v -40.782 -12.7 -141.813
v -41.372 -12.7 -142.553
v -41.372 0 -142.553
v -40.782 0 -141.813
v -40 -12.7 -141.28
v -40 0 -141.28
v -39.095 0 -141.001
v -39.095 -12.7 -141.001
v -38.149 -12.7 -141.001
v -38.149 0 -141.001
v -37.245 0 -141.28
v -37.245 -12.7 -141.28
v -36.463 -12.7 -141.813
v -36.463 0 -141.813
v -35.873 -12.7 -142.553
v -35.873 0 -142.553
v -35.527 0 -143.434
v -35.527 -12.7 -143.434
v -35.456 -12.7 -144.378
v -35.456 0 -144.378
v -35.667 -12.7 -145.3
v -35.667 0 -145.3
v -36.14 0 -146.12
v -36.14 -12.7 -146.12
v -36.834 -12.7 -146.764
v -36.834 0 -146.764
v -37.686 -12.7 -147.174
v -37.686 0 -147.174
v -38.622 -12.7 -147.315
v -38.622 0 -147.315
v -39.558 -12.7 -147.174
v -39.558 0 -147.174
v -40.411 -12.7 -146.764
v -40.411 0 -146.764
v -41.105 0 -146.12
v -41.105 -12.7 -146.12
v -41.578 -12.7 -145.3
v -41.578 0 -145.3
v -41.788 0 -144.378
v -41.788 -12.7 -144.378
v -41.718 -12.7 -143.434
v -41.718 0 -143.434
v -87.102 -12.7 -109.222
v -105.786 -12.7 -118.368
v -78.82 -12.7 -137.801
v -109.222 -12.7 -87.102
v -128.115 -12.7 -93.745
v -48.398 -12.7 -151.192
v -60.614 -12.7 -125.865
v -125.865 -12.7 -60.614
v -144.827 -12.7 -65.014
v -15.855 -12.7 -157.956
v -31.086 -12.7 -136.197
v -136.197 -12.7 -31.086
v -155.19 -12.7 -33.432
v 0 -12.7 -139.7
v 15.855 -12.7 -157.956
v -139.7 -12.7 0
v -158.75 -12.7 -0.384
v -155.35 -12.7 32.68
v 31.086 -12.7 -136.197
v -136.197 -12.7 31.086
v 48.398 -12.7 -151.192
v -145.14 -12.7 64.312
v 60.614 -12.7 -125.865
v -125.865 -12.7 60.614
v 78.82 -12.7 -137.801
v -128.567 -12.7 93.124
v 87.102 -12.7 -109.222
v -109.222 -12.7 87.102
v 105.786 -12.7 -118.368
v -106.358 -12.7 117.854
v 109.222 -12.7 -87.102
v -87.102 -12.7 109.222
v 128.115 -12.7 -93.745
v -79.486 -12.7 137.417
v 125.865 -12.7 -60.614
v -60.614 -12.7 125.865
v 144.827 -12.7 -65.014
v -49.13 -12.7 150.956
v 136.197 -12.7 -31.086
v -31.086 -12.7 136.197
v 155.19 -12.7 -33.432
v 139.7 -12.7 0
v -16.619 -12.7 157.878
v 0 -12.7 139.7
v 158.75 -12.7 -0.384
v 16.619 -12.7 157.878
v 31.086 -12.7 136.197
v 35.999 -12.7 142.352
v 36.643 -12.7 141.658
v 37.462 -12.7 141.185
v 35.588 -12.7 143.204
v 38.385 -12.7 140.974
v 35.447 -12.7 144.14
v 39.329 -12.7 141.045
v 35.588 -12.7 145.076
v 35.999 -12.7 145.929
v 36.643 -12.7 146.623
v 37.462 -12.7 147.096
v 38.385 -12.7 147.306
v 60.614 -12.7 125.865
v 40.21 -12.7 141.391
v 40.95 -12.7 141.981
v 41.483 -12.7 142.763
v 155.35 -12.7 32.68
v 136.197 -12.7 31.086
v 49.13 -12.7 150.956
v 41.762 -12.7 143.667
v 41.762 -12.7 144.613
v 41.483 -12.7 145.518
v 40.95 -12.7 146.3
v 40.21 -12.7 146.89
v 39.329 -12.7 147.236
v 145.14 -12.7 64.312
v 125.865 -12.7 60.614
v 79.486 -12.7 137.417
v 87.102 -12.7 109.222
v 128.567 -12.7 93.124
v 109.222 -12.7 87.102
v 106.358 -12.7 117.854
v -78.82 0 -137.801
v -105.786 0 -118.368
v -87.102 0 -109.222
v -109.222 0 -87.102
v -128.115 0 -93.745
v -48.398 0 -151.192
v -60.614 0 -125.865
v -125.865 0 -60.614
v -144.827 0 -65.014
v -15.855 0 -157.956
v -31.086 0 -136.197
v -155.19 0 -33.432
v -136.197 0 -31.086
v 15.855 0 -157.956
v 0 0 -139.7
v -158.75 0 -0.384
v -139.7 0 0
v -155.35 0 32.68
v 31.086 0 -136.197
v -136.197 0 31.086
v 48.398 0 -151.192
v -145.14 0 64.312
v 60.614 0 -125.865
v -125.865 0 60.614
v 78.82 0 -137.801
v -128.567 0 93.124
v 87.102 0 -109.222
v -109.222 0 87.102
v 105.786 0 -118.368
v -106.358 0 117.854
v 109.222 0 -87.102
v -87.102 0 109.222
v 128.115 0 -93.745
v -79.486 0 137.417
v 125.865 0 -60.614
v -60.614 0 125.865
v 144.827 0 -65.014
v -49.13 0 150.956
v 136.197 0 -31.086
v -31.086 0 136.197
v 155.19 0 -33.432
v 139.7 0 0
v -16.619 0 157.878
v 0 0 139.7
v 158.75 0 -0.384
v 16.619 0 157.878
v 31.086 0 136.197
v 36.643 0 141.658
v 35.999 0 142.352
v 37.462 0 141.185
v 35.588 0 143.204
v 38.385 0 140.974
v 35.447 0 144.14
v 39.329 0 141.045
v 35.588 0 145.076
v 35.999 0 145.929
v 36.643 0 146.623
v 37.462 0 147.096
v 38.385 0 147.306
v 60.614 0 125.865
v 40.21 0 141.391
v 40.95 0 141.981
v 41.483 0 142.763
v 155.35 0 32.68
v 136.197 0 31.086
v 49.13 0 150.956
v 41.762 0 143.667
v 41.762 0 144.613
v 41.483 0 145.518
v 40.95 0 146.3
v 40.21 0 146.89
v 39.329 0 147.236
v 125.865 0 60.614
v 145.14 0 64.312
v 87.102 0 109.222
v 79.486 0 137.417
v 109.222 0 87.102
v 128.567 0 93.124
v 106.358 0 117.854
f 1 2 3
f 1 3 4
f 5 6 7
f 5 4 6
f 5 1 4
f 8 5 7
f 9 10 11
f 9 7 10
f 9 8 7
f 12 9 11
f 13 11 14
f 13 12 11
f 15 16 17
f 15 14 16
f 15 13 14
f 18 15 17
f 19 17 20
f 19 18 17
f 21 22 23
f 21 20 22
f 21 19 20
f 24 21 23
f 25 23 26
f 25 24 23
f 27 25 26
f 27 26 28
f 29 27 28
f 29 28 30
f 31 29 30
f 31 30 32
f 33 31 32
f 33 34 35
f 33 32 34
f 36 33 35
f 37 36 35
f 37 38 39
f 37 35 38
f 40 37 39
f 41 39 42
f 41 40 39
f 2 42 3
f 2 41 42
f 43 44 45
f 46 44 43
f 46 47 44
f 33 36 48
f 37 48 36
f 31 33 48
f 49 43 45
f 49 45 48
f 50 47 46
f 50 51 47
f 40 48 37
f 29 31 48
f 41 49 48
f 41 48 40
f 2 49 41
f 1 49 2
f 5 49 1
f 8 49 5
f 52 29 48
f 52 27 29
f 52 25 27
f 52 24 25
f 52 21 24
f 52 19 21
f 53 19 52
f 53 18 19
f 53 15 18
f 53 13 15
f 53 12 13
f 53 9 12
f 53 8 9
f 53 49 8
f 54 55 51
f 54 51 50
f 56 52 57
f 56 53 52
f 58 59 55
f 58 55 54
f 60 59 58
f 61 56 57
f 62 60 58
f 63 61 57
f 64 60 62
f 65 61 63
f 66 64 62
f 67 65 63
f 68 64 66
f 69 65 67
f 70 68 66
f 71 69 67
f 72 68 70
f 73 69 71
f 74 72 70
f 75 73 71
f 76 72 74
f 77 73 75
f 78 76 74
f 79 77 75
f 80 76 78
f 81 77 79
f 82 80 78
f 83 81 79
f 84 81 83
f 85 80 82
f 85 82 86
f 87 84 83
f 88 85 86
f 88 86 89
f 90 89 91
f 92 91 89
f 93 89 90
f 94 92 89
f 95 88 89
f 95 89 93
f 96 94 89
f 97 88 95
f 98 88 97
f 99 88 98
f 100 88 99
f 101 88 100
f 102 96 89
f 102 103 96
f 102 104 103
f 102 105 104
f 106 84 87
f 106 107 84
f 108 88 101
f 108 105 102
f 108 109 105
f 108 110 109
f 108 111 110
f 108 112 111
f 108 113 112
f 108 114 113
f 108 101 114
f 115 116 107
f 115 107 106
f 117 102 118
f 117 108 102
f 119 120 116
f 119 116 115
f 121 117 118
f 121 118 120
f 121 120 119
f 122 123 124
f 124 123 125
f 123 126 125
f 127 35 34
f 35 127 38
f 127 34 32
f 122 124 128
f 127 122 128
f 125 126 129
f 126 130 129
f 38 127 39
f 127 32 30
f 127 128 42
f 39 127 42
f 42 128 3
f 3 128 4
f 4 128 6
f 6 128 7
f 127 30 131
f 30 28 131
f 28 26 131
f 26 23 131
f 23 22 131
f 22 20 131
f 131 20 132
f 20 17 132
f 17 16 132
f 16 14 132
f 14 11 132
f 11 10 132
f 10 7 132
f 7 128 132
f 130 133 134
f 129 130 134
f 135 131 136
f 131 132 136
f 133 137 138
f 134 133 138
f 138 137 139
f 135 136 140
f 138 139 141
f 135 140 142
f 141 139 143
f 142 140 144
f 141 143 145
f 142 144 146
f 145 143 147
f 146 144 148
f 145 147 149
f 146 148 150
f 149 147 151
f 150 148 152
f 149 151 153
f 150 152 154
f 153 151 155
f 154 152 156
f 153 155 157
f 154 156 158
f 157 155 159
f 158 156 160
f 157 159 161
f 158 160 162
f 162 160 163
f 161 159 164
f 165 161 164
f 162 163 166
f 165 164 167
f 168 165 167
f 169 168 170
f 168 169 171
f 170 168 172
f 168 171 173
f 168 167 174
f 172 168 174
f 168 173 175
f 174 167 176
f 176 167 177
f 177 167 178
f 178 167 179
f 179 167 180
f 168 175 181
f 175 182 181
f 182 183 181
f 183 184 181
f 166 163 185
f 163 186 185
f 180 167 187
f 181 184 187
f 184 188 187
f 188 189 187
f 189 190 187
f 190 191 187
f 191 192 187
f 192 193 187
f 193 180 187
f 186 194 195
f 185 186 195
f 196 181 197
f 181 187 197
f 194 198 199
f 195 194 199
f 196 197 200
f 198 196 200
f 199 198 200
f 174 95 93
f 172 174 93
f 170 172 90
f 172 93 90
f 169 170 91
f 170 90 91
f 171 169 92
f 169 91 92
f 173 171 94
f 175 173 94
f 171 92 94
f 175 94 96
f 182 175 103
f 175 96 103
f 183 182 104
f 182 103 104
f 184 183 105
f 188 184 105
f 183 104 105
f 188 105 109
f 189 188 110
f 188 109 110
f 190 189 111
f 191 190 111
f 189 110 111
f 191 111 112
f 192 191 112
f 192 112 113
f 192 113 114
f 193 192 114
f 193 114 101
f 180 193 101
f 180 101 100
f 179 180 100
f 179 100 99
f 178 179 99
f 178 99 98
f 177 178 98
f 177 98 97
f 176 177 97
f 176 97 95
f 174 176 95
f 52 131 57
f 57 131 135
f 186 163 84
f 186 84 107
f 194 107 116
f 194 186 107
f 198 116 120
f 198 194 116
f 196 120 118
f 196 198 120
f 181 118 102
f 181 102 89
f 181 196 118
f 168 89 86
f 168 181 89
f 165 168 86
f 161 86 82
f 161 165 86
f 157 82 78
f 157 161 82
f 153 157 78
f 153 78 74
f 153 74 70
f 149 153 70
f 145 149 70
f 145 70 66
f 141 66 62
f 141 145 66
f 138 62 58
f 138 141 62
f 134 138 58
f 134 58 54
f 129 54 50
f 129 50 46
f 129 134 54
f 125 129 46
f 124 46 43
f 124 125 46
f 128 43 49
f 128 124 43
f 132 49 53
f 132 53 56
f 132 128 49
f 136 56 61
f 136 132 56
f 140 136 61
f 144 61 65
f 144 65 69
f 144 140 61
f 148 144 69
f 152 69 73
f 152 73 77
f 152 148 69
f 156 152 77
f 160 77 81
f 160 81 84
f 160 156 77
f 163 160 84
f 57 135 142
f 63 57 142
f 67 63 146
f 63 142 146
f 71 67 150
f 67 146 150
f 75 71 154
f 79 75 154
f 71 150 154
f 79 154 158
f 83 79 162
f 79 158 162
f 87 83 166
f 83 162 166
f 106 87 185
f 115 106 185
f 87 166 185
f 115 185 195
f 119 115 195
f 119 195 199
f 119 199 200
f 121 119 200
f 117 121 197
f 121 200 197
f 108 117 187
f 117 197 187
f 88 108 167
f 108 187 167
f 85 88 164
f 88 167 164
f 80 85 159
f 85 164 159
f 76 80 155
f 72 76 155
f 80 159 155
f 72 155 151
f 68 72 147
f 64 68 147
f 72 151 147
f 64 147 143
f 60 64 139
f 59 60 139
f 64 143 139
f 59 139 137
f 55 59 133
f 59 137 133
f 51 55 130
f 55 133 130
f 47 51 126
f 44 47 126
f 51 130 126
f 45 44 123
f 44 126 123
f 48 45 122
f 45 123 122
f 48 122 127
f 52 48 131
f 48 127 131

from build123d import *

# Parameters (mm, degrees)
F0_R     = 139.7
F1_DEPTH = 12.7
F6_D     = 6.35
F6_DEPTH = 50.8
F6_TIP   = 1.9077324654


# Not quite as in the source:
# - a pattern or mirror of a feature is missing from the dataset's text; its kind, count and spacing are read off the source's solid


with BuildPart() as f1:
    # F0 (on Front) → F1 (new body)
    with BuildSketch(Plane.XZ):
        with BuildLine():
            ThreePointArc((15.8551438321, -157.95625), (0, 158.75), (-15.8551438321, -157.95625))
            Line((-15.8551438321, -157.95625), (15.8551438321, -157.95625))
        make_face()
        Circle(F0_R, mode=Mode.SUBTRACT)
    extrude(amount=F1_DEPTH)

    # F6
    with Locations(Plane(origin=(0, 0, 0), x_dir=(1, 0, 0), z_dir=(0, 1, 0))):
        with Locations((38.6222720054, -144.140281428)):
            f6 = Hole(F6_D / 2, depth=F6_DEPTH)
            with Locations((0, 0, -(F6_DEPTH + F6_TIP / 2))):  # 118° drill point
                Cone(0, F6_D / 2, F6_TIP, mode=Mode.SUBTRACT)

    # F6_copies: F6 across plane
    add(f6.mirror(Plane(origin=(0, 0, 0), x_dir=(-0.9659258263, 0, 0.2588190451), z_dir=(-0.2588190451, 0, -0.9659258263))), mode=Mode.SUBTRACT)


solid = f1.part
